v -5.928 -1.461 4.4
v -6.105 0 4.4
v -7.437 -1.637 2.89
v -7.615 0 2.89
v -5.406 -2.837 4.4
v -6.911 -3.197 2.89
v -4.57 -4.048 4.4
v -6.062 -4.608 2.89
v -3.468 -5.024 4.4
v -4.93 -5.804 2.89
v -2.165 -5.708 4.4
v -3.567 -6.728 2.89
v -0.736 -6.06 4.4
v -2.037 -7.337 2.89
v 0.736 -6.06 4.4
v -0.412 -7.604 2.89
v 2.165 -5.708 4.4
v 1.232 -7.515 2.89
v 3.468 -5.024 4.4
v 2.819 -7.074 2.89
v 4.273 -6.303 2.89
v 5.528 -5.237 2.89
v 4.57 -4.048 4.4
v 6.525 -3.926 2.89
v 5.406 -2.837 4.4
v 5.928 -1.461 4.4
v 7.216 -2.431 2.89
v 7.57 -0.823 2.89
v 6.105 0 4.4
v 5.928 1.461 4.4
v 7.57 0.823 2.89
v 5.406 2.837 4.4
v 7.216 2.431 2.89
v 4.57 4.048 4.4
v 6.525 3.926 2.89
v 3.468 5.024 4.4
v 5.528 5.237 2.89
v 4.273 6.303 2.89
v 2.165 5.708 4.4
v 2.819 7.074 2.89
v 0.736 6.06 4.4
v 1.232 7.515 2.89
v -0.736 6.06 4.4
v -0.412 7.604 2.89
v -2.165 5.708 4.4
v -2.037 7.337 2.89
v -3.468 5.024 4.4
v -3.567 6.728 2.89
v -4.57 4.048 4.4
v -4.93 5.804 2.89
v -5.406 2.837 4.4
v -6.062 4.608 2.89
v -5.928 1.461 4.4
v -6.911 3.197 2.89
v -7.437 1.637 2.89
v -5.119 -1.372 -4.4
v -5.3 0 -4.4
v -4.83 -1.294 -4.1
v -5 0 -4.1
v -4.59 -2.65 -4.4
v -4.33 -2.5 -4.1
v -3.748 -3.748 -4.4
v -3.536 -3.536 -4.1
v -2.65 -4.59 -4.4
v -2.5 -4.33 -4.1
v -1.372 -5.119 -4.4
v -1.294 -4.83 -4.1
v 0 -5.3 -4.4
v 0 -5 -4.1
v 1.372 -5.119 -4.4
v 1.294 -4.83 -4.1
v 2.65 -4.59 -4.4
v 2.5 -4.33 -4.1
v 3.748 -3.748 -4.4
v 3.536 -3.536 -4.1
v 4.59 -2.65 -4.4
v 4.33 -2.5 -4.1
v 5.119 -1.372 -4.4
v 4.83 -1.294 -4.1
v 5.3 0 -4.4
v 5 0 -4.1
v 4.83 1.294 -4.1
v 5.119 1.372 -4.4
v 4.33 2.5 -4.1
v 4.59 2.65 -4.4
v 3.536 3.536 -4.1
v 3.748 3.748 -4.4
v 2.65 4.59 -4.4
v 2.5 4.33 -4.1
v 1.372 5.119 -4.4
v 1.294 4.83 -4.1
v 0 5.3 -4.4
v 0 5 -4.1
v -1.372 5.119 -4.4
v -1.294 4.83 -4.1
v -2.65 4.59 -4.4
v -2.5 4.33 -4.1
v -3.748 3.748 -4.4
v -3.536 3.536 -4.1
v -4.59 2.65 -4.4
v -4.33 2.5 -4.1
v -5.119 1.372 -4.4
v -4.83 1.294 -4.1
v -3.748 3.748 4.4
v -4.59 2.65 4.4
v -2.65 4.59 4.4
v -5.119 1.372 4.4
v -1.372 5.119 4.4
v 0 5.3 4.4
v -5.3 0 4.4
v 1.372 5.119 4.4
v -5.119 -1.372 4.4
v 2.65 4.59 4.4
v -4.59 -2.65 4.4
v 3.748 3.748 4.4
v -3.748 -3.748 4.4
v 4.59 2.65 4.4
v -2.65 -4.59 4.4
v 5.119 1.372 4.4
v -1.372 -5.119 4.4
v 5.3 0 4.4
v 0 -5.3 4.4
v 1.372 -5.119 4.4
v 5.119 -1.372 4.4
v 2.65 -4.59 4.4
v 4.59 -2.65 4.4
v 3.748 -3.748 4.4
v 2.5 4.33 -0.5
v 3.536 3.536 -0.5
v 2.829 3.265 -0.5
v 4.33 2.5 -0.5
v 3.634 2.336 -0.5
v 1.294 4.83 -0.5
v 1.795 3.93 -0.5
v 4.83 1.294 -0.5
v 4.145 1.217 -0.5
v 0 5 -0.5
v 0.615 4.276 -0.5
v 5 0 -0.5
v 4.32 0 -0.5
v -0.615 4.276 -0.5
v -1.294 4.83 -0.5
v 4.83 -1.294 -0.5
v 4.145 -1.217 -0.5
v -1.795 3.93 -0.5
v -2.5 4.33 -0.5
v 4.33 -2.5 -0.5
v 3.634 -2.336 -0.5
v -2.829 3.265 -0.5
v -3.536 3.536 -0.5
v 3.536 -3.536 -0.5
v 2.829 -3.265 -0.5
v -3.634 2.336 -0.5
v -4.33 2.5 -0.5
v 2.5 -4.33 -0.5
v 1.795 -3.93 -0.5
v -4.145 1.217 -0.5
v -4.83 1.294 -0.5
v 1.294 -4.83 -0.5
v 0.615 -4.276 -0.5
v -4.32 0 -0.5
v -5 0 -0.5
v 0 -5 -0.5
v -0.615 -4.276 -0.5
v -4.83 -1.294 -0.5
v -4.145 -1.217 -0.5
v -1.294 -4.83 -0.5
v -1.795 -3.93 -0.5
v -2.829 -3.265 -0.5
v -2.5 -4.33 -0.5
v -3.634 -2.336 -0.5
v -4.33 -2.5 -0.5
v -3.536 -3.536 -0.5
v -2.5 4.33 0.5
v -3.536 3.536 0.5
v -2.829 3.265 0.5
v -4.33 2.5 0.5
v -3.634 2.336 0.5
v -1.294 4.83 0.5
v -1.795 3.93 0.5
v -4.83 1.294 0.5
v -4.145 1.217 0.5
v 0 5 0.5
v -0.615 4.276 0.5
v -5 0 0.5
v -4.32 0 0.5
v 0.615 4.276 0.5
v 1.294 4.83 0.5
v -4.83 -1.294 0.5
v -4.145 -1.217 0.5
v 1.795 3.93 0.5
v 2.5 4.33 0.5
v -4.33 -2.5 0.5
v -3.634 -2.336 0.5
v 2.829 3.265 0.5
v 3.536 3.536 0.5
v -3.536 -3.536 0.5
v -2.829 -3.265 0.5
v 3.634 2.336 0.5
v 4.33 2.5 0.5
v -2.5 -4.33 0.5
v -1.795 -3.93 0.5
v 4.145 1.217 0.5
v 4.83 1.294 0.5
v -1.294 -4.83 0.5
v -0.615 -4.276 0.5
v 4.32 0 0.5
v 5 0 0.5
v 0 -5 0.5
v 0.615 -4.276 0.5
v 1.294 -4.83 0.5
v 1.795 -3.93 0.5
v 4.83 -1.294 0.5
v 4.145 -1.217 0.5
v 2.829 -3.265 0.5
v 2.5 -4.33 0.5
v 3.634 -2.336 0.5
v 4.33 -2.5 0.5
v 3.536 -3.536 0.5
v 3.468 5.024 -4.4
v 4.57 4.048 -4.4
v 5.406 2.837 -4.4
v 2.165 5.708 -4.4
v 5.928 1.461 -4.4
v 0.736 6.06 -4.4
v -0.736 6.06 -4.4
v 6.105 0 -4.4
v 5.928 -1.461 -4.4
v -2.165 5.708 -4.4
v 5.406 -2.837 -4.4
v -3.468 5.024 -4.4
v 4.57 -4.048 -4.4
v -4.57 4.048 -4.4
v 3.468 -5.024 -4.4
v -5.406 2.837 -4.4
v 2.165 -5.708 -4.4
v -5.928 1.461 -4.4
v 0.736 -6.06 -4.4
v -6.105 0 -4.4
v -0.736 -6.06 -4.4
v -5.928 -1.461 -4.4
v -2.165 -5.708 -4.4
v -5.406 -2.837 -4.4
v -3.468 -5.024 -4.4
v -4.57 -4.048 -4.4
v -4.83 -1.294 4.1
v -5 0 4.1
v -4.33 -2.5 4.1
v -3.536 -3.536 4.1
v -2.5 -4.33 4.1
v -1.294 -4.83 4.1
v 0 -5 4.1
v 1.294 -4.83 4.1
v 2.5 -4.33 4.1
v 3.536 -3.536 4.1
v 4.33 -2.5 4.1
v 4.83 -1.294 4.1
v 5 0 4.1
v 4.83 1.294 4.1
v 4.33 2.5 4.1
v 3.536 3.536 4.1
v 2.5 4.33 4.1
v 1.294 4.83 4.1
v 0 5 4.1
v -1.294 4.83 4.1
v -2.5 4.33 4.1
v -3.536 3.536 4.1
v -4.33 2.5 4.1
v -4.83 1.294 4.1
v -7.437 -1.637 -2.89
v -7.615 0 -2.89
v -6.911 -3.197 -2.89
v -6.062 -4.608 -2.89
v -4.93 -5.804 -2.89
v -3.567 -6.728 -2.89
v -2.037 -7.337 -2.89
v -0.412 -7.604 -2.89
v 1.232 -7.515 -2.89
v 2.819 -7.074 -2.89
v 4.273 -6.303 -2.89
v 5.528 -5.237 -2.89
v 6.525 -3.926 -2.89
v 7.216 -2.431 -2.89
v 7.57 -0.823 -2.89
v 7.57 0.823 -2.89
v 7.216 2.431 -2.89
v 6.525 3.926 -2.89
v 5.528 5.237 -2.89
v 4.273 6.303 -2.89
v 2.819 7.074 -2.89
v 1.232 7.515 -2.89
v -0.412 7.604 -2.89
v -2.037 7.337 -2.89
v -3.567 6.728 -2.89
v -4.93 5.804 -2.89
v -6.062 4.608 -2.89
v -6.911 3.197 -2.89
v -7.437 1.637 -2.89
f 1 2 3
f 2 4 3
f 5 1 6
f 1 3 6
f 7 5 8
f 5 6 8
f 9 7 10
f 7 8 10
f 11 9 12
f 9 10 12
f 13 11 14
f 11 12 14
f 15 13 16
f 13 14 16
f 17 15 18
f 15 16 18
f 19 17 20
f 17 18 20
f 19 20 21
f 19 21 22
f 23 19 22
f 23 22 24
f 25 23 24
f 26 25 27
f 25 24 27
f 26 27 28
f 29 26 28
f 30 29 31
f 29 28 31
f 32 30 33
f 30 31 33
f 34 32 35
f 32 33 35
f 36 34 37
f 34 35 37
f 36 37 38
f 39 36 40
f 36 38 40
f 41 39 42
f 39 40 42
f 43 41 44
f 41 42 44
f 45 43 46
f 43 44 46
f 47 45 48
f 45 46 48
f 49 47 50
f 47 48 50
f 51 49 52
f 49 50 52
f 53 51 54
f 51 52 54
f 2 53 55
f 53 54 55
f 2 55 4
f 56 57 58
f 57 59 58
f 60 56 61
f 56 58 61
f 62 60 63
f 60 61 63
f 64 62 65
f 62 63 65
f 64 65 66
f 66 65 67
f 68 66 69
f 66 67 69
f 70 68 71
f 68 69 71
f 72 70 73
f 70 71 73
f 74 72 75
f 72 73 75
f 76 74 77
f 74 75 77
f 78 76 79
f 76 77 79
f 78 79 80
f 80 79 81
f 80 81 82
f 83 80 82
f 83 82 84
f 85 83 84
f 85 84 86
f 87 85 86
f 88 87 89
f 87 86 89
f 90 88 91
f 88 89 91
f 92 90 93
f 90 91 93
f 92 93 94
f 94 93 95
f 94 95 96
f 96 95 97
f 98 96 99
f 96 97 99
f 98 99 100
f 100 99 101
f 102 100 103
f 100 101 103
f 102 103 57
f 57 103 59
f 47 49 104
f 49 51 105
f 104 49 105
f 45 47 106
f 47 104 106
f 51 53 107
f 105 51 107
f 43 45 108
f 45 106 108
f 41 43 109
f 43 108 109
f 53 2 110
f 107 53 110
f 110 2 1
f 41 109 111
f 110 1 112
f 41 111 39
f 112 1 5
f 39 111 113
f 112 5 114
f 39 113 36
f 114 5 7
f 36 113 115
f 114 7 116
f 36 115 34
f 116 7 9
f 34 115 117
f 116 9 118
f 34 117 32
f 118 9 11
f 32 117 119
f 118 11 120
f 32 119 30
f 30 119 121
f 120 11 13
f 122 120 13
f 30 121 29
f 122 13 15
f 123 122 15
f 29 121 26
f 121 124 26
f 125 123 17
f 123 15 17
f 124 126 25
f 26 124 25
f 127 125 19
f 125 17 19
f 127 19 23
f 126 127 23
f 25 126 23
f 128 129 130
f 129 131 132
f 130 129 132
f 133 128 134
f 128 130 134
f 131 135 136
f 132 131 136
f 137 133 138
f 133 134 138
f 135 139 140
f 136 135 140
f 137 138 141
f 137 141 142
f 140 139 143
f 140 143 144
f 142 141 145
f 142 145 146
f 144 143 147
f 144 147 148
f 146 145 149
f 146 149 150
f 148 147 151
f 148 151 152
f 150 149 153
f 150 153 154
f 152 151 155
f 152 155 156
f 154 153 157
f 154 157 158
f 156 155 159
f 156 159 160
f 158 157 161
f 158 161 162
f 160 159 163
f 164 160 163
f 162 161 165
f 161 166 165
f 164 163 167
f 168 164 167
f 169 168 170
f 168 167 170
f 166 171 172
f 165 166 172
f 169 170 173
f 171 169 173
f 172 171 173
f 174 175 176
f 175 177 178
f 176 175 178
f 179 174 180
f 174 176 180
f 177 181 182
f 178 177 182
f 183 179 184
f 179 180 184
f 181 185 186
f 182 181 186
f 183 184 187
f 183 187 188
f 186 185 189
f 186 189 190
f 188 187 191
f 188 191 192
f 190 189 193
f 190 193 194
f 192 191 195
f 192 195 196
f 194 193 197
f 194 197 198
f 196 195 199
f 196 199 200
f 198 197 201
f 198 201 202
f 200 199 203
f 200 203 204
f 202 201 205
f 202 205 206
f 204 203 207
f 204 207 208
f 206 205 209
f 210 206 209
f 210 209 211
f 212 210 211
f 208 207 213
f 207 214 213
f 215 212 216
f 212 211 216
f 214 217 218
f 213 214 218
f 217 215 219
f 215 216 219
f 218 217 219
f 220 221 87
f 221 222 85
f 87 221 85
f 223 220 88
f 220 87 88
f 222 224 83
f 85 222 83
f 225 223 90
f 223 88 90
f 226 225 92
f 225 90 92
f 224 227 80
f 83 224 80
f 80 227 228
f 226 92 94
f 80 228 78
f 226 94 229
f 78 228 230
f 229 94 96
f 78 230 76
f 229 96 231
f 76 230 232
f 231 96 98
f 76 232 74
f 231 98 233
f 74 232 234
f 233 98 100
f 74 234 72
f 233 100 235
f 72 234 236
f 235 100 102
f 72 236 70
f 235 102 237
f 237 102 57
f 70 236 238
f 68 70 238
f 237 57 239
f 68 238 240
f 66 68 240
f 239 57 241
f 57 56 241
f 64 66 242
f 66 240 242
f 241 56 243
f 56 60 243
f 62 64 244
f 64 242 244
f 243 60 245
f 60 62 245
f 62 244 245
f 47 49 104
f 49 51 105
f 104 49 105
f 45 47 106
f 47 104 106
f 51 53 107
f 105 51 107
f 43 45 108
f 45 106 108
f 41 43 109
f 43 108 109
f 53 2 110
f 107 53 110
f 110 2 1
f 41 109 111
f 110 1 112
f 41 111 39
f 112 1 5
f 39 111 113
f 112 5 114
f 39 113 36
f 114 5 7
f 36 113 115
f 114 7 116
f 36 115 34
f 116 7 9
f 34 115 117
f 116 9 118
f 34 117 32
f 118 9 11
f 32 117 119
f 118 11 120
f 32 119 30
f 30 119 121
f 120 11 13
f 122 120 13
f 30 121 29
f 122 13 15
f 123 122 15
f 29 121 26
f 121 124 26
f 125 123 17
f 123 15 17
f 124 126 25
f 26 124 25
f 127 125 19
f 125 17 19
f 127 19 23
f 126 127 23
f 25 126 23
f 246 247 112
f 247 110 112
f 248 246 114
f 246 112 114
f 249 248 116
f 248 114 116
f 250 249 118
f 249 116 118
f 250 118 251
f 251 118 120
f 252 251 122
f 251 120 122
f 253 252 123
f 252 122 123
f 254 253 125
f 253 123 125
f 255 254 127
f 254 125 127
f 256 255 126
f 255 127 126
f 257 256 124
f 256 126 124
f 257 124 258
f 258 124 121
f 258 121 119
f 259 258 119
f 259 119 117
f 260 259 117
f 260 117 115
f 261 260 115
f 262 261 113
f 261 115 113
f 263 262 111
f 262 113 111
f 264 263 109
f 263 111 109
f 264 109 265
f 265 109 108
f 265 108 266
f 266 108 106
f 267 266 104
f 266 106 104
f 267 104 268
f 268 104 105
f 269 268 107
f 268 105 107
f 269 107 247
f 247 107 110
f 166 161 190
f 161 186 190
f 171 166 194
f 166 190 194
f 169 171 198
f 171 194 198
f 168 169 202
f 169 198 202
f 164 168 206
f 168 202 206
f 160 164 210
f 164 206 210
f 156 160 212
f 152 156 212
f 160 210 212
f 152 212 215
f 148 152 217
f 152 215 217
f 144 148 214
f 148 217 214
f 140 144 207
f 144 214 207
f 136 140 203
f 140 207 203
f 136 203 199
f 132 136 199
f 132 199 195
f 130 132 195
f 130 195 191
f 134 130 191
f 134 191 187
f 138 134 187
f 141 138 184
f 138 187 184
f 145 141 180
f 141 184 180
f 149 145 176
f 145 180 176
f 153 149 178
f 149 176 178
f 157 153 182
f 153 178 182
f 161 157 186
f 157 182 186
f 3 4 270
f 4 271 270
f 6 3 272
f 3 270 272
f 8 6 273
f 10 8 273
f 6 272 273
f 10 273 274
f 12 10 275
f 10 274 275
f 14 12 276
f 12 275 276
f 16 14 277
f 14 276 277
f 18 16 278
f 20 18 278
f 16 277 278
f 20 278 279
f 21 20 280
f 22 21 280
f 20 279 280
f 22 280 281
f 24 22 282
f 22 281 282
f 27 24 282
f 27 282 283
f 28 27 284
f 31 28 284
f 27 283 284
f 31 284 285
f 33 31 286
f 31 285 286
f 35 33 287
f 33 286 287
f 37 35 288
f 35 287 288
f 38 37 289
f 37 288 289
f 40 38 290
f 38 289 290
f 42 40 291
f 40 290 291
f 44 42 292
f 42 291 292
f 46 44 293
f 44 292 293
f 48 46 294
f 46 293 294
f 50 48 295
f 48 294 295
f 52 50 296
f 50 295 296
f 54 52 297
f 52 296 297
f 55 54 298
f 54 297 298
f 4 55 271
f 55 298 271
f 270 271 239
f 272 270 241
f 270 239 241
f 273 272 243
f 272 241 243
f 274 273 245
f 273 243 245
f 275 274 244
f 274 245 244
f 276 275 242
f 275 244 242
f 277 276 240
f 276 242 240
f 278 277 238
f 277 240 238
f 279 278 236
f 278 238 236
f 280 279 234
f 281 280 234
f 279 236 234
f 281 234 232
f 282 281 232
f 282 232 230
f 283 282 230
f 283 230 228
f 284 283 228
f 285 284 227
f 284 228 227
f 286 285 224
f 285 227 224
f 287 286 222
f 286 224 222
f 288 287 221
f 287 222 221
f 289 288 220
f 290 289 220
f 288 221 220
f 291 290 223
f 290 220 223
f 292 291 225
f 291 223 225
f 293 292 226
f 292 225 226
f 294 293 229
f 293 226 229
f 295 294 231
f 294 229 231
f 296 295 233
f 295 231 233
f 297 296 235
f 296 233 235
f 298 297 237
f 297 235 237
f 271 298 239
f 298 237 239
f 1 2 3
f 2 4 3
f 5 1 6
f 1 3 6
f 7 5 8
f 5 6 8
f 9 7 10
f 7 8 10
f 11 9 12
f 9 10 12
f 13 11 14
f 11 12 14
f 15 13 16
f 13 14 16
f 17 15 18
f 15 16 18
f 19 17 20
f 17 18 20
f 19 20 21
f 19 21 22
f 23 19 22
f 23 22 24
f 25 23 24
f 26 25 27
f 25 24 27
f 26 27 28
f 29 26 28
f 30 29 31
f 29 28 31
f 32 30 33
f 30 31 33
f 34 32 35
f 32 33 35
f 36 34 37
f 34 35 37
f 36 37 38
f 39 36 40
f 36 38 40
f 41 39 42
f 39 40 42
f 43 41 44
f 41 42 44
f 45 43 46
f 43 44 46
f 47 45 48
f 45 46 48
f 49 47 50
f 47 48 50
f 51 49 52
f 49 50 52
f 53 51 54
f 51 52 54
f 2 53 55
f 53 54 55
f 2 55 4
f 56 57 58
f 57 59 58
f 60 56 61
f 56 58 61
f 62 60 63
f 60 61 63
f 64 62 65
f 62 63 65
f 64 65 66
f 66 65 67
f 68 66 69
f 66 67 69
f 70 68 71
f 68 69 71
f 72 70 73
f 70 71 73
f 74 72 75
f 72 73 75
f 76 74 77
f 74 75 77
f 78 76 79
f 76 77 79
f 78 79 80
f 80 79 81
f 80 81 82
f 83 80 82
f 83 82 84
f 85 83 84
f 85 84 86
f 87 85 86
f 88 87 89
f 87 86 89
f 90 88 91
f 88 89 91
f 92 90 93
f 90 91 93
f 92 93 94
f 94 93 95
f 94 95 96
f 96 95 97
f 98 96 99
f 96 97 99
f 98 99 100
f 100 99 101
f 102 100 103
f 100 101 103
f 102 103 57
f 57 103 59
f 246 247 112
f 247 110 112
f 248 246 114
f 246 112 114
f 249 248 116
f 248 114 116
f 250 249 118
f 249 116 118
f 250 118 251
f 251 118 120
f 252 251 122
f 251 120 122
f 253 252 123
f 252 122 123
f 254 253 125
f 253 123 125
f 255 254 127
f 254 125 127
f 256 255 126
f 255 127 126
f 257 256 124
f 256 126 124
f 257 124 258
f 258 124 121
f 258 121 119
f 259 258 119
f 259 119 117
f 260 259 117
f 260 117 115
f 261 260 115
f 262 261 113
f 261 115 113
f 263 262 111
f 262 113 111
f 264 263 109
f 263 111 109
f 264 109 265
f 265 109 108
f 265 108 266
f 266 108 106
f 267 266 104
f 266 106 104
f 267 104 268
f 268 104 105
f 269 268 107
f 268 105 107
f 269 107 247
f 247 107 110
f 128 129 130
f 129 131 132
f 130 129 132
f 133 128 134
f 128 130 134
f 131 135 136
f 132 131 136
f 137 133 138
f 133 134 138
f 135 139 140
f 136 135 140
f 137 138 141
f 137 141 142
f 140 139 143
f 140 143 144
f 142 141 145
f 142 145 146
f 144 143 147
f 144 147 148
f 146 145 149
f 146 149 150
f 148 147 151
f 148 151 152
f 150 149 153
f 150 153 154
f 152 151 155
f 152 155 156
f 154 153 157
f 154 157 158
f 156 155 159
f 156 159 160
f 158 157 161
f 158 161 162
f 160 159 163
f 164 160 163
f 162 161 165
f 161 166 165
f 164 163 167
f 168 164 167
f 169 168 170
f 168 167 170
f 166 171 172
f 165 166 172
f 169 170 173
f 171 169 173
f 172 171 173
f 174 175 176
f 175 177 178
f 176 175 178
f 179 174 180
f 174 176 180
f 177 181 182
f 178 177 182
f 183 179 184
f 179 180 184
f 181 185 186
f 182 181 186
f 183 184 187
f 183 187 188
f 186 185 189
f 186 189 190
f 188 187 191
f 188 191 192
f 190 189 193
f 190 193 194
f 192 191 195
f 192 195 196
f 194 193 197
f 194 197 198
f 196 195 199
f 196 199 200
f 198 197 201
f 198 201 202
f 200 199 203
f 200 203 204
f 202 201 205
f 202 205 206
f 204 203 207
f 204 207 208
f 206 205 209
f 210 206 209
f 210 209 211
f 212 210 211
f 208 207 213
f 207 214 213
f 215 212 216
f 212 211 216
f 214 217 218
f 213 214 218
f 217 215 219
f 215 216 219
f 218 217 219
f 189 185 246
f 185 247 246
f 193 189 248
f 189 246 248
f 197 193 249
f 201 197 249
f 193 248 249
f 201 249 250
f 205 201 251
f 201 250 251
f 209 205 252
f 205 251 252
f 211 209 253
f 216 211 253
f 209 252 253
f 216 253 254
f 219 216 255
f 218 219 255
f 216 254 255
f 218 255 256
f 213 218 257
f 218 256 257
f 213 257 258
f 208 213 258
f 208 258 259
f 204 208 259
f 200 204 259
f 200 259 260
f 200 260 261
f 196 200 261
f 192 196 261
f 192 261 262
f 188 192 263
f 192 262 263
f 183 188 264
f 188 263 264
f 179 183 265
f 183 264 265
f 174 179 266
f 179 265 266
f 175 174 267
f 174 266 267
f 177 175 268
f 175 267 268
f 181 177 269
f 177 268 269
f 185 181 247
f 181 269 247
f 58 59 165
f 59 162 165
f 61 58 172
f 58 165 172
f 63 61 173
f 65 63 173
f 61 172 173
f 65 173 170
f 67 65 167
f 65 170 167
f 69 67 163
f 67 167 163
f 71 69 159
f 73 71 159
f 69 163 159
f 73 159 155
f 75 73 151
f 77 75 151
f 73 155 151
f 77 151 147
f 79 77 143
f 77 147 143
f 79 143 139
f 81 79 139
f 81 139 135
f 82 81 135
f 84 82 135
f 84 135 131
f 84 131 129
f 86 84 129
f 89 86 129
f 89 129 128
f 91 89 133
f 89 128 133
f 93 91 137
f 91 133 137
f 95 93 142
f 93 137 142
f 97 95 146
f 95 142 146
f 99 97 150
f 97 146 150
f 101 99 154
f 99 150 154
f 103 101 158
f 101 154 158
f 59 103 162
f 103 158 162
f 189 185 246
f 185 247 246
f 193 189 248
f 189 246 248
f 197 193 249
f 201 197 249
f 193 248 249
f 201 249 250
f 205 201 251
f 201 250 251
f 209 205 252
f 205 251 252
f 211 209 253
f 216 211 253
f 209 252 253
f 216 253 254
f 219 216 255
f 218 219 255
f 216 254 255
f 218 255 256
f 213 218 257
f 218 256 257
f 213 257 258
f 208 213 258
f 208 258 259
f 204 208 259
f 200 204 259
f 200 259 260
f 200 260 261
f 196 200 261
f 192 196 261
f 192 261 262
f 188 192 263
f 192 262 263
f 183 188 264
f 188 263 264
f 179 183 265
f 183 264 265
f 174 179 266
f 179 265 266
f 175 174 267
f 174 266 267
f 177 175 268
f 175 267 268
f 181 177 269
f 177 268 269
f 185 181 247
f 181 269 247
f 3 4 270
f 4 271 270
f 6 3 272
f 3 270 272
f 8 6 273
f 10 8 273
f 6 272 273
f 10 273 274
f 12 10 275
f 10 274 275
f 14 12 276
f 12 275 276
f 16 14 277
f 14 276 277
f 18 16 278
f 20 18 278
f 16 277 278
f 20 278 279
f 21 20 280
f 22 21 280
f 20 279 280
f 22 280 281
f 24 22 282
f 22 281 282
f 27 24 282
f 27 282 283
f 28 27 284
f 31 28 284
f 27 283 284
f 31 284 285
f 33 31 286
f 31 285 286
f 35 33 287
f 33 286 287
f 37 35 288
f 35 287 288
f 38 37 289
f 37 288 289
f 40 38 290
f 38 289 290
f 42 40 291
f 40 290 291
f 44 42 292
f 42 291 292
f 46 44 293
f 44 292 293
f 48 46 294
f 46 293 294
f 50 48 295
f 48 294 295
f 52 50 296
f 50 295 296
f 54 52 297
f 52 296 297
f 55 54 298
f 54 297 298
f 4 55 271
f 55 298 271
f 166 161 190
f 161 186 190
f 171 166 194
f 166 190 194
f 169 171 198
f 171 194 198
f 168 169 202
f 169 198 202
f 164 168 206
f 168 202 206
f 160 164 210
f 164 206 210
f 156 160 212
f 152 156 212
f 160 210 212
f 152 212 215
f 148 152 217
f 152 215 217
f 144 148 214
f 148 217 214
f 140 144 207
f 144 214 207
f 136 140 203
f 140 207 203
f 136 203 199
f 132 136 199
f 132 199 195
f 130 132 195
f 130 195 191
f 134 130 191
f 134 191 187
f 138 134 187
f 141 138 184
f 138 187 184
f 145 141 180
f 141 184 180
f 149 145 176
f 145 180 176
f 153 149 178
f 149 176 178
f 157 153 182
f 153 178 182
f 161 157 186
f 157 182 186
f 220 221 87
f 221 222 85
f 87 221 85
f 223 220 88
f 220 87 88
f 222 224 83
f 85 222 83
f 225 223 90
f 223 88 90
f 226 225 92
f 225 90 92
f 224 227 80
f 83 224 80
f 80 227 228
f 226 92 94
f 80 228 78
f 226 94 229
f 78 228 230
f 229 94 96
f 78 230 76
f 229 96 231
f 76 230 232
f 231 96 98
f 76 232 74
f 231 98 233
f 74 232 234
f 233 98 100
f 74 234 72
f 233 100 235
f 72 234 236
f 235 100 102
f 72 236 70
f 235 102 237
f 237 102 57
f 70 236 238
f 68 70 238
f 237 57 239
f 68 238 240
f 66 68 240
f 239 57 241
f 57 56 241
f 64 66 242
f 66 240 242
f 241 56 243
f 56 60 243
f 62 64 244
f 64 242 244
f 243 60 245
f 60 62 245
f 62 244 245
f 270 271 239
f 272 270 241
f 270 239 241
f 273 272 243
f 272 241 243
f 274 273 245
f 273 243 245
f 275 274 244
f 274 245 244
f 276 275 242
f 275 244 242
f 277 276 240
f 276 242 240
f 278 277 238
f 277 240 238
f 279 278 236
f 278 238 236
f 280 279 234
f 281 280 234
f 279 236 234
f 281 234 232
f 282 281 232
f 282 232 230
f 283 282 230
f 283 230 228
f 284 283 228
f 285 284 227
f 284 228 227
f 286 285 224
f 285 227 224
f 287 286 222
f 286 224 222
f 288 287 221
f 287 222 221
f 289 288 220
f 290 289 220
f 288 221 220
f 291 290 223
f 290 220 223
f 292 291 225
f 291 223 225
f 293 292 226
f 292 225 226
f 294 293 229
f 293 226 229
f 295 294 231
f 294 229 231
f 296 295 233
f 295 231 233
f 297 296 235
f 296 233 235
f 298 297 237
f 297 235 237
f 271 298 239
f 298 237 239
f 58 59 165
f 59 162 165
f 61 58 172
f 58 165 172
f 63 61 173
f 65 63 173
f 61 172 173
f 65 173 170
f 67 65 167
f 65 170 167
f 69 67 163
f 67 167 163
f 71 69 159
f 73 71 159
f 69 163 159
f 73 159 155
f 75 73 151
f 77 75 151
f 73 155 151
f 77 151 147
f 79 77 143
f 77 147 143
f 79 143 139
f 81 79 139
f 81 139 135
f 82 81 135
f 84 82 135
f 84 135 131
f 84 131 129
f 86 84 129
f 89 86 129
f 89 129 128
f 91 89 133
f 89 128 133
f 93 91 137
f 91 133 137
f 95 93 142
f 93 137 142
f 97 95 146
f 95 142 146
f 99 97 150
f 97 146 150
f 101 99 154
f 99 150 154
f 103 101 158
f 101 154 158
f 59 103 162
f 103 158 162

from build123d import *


with BuildPart() as f1:
    # F0 (on Front) → F1 (revolve)
    with BuildSketch(Plane.XZ):
        Polygon((-5, 4.1), (-5.3, 4.4), (-6.105, 4.4), (-7.615, 2.89), (-7.615, -2.89), (-6.105, -4.4), (-5.3, -4.4), (-5, -4.1), (-5, -0.5), (-4.32, -0.5), (-4.32, 0.5), (-5, 0.5), align=None)
    revolve(axis=Axis((0, 0, 0), (0, 0, 1)))


with BuildPart() as f2:
    # F0 (on Front) → F2 (revolve)
    with BuildSketch(Plane.XZ):
        Polygon((-5, 4.1), (-5.3, 4.4), (-6.105, 4.4), (-7.615, 2.89), (-7.615, -2.89), (-6.105, -4.4), (-5.3, -4.4), (-5, -4.1), (-5, -0.5), (-4.32, -0.5), (-4.32, 0.5), (-5, 0.5), align=None)
    revolve(axis=Axis((0, 0, 0), (0, 0, 1)))


solid = Compound([f1.part, f2.part])
